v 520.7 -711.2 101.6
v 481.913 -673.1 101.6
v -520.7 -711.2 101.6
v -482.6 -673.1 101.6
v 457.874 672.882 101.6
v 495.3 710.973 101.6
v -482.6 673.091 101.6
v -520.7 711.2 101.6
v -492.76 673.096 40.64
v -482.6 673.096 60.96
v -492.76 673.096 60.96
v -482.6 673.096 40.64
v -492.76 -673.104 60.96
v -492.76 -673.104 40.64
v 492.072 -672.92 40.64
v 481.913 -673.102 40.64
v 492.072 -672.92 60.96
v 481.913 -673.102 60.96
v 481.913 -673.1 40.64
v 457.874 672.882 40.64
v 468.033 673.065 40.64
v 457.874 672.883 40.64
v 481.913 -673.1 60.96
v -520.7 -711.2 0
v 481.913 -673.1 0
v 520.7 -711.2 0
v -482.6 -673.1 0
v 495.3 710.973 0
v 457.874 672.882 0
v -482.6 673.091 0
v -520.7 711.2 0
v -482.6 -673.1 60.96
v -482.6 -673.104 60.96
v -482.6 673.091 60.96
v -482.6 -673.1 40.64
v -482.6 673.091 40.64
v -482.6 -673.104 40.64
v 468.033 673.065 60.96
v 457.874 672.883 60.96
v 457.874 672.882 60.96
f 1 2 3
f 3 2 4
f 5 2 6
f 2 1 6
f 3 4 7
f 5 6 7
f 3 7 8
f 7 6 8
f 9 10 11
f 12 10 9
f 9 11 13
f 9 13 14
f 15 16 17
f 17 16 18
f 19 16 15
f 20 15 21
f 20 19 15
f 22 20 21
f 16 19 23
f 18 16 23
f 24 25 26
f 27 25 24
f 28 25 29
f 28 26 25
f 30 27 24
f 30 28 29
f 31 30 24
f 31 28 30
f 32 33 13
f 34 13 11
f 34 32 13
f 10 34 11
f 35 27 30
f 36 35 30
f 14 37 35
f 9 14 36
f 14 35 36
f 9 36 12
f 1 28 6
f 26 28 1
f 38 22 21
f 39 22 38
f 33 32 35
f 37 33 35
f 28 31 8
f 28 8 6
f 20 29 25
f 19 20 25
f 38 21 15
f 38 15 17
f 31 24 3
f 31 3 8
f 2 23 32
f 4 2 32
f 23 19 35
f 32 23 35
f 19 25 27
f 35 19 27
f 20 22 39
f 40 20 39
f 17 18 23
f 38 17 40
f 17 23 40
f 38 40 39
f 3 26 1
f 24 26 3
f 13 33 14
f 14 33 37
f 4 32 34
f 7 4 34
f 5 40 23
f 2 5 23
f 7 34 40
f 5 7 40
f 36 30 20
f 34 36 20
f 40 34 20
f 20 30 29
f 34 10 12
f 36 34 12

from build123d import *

# Parameters (mm, degrees)
BOSS_EXTRUDE1_DEPTH = 101.6
SKETCH3_W           = 20.32
SKETCH3_H           = 1346.2
CUT_EXTRUDE1_DEPTH  = 10.16
SKETCH4_W           = 20.32
SKETCH4_H           = 1346.2
CUT_EXTRUDE2_DEPTH  = 10.16


with BuildPart() as part:
    # Sketch2 → Boss-Extrude1 (new body)
    with BuildSketch(Plane.XY):
        Polygon((-520.7, 711.2), (495.299974685, 710.973195751), (520.7, -711.2), (-520.7, -711.2), align=None)
        Polygon((-482.6, 673.091493891), (457.874215728, 672.881549449), (481.913457595, -673.1), (-482.6, -673.1), align=None, mode=Mode.SUBTRACT)
    extrude(amount=BOSS_EXTRUDE1_DEPTH)

    # Sketch3 → Cut-Extrude1 (cut)
    with BuildSketch(Plane(origin=(469.742047624, 8.389596947, 0), x_dir=(0, 0, 1), z_dir=(-0.9998405481942395, -0.01785716065455791, 0))):
        with Locations((50.8, -8.500177591)):
            Rectangle(SKETCH3_W, SKETCH3_H)
    extrude(amount=-CUT_EXTRUDE1_DEPTH, mode=Mode.SUBTRACT)

    # Sketch4 → Cut-Extrude2 (cut)
    with BuildSketch(Plane(origin=(-482.6, 0, 0), x_dir=(0, 0, -1), z_dir=(1, 0, 0))):
        with Locations((-50.8, -0.004253054)):
            Rectangle(SKETCH4_W, SKETCH4_H)
    extrude(amount=-CUT_EXTRUDE2_DEPTH, mode=Mode.SUBTRACT)


solid = part.part
